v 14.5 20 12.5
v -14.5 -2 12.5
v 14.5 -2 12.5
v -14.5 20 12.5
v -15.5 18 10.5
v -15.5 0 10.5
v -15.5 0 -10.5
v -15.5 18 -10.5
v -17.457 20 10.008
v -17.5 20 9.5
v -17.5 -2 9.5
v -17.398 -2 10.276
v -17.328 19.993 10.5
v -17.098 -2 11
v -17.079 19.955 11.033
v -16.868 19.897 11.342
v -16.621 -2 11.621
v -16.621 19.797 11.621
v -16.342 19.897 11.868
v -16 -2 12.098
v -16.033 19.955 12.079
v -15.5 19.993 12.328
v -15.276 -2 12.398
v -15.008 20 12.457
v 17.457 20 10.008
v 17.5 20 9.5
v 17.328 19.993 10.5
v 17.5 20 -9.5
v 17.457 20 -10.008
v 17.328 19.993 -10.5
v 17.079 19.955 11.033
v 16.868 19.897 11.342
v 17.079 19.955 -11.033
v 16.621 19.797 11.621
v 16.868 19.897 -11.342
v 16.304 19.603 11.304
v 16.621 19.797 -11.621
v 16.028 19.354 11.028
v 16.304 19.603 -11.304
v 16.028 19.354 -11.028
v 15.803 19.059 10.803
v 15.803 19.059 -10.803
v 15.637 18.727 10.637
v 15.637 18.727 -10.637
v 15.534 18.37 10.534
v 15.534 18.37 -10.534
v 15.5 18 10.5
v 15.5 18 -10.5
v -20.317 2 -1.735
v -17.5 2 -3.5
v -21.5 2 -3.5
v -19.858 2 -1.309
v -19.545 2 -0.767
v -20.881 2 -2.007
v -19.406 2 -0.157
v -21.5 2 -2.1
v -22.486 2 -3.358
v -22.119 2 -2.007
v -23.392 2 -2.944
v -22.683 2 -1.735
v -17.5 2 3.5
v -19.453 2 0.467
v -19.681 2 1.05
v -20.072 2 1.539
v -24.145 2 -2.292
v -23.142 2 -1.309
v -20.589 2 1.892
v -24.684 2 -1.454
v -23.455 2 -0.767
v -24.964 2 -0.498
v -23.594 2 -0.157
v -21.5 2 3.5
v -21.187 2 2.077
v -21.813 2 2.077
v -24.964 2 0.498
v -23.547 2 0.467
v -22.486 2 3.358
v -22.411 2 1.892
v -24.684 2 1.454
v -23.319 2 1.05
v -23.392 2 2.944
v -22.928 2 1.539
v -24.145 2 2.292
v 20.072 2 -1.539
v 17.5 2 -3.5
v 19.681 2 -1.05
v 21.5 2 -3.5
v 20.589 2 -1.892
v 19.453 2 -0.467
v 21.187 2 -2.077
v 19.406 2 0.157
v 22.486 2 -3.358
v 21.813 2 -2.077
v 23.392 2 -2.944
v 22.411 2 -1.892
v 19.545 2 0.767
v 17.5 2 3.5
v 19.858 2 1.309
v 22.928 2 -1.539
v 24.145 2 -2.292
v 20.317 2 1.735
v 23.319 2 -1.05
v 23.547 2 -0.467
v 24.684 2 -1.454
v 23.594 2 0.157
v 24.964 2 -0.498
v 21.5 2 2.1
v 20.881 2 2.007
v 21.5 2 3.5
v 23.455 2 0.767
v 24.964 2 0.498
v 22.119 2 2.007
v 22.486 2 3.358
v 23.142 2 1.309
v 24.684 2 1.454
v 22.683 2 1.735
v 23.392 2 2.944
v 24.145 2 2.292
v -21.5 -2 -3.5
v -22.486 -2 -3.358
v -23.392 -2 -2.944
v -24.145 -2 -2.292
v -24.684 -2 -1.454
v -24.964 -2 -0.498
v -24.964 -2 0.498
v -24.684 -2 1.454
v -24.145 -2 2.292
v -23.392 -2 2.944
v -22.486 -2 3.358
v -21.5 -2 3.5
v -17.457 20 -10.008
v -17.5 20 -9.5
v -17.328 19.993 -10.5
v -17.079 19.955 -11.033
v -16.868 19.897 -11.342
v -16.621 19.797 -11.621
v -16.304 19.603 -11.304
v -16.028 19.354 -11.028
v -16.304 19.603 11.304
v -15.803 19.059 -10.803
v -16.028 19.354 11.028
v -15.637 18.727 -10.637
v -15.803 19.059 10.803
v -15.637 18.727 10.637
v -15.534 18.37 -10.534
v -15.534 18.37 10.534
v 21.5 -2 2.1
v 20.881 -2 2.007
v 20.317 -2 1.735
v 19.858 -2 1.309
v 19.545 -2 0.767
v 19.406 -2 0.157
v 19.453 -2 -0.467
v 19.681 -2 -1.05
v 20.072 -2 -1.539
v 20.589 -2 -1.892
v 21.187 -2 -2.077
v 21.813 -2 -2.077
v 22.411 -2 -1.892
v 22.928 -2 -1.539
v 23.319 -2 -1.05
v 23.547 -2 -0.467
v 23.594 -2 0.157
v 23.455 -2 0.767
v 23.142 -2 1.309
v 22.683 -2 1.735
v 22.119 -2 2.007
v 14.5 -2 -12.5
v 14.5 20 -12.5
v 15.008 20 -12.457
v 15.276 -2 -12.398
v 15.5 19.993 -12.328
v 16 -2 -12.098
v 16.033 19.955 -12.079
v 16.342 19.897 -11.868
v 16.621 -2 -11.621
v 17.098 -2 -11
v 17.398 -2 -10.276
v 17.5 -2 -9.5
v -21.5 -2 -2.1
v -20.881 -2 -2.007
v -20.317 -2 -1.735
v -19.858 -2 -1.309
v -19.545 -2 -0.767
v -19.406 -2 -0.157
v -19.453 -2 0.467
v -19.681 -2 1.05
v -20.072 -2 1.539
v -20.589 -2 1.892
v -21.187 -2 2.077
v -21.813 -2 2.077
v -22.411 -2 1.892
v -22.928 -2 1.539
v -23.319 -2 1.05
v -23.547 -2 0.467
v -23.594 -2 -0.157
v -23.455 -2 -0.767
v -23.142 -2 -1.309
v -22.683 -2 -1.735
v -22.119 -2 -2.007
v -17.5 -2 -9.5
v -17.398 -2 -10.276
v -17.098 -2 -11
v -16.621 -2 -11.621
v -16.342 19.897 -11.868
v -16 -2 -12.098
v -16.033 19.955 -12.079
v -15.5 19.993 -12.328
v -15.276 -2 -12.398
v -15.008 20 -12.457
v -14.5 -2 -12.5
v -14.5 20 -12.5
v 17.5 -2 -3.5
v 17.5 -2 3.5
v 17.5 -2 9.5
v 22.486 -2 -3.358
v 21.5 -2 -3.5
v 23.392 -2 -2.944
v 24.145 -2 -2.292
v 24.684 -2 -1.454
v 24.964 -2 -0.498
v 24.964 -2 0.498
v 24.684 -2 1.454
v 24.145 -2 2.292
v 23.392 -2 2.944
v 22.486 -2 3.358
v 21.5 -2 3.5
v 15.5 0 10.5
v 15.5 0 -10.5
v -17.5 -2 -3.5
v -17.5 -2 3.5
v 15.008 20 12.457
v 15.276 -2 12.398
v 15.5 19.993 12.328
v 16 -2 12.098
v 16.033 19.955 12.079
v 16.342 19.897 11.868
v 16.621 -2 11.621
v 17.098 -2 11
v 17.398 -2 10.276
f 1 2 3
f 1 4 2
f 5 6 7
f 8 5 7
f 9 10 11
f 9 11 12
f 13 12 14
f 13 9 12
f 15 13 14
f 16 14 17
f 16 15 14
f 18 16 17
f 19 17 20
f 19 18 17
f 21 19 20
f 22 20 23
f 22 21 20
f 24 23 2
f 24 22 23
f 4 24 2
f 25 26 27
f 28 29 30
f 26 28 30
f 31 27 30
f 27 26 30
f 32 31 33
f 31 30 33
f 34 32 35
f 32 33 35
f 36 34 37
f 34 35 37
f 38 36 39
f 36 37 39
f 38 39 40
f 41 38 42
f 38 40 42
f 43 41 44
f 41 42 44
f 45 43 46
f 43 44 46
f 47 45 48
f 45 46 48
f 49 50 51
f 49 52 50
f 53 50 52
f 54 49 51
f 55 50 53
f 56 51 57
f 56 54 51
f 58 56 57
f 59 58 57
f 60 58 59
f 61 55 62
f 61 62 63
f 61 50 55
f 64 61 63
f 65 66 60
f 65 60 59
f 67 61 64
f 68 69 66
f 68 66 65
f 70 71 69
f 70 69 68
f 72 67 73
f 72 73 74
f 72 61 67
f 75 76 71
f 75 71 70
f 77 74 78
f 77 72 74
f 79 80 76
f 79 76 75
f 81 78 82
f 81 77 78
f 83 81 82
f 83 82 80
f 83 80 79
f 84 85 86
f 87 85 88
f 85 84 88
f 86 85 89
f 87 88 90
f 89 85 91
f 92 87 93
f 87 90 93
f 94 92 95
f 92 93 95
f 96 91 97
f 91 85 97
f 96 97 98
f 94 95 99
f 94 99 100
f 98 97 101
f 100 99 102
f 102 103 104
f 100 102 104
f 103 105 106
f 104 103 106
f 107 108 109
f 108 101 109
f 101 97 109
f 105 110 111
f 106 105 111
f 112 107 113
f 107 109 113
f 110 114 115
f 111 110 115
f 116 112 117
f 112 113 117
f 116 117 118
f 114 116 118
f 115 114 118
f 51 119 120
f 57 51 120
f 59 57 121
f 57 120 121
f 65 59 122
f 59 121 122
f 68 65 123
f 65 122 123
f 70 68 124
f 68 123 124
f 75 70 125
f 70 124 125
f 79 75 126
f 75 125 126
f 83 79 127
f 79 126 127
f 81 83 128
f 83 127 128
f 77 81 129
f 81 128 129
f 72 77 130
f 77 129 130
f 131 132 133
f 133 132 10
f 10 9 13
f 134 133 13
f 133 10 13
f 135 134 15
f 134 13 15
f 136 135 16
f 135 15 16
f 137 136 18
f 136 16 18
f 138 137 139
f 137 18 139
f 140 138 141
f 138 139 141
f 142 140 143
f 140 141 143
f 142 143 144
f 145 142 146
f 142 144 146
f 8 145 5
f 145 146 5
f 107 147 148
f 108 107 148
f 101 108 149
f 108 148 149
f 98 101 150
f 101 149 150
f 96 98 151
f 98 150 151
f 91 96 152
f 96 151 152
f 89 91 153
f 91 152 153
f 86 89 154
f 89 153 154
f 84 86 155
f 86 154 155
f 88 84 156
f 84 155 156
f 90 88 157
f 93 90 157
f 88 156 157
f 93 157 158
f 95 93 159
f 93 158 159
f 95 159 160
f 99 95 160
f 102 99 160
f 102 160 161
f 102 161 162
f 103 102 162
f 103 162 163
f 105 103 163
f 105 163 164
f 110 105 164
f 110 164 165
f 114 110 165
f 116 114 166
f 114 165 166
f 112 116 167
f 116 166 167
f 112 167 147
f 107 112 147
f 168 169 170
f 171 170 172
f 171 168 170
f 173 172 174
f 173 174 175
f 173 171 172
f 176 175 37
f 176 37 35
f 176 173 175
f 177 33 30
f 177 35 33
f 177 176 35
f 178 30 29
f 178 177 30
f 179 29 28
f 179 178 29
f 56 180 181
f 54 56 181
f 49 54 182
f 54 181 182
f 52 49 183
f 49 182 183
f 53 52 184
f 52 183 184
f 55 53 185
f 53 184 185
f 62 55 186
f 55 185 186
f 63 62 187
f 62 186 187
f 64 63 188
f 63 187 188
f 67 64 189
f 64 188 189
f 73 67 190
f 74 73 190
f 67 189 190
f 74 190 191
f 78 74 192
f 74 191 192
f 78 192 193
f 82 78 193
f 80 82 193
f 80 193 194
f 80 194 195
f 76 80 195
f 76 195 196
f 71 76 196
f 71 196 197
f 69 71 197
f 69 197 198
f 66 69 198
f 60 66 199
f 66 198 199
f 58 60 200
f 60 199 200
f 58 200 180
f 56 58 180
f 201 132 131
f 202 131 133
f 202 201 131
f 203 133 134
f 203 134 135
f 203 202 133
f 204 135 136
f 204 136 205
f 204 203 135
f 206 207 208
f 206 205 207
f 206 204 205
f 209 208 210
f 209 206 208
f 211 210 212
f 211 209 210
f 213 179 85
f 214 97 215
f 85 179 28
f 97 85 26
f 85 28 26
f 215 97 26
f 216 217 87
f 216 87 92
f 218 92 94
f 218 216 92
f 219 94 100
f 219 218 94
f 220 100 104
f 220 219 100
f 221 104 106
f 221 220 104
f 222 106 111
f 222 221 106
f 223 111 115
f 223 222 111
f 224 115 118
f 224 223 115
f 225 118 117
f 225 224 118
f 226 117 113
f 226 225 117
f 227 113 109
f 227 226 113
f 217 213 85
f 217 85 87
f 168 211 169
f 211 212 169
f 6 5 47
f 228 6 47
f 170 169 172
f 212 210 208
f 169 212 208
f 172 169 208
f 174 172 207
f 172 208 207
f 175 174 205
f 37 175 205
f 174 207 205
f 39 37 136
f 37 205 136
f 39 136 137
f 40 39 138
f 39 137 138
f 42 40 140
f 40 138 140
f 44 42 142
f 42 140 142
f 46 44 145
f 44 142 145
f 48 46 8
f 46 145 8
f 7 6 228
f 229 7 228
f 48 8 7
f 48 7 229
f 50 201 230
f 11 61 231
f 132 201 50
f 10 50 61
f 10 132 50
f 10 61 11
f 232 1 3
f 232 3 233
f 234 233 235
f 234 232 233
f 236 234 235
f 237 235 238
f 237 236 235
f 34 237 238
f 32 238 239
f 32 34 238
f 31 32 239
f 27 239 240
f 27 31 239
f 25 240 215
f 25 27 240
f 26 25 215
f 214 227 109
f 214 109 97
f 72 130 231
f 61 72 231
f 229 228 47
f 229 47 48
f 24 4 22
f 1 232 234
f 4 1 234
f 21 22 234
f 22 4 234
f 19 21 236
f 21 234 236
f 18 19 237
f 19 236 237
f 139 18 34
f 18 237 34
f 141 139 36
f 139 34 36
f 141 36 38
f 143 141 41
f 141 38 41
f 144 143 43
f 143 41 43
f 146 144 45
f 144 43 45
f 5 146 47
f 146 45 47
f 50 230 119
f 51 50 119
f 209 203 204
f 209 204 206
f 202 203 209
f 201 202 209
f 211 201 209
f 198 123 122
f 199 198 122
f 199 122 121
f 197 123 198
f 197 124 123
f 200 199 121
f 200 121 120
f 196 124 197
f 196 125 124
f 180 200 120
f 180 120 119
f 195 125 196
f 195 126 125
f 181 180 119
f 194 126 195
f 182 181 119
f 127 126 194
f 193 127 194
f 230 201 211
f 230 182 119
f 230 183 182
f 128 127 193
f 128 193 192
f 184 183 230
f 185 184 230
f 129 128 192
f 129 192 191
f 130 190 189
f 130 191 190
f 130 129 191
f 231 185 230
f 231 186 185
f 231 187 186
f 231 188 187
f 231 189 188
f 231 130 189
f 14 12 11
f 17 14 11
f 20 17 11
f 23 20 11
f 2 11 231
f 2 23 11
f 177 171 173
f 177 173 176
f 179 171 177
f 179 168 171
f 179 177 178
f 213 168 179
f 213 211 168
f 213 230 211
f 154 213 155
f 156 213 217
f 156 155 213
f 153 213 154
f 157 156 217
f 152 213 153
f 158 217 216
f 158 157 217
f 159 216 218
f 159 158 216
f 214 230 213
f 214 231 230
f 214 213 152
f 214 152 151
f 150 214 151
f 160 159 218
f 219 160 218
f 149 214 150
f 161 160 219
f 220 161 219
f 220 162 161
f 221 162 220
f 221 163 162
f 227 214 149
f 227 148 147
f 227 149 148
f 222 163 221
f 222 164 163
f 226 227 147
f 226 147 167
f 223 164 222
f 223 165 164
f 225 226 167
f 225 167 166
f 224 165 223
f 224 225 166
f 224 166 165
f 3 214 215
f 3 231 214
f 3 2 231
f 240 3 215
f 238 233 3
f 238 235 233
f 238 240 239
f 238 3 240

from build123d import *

# Parameters (mm, degrees)
SKETCH2_W           = 35
SKETCH2_H           = 25
SKETCH2_W_2         = 31
SKETCH2_H_2         = 21
BOSS_EXTRUDE1_DEPTH = 20
SKETCH3_W           = 35
SKETCH3_H           = 25
BOSS_EXTRUDE2_DEPTH = 2
SKETCH4_R           = 2.1
BOSS_EXTRUDE3_DEPTH = 4
FILLET1_R           = 3
FILLET2_R           = 2


with BuildPart() as part:
    # Sketch2 → Boss-Extrude1 (new body)
    with BuildSketch(Plane(origin=(0, 0, 0), x_dir=(1, 0, 0), z_dir=(0, 1, 0))):
        Rectangle(SKETCH2_W, SKETCH2_H)
        Rectangle(SKETCH2_W_2, SKETCH2_H_2, mode=Mode.SUBTRACT)
    extrude(amount=BOSS_EXTRUDE1_DEPTH)

    # Sketch3 → Boss-Extrude2 (add)
    with BuildSketch(Plane.XZ):
        Rectangle(SKETCH3_W, SKETCH3_H)
    extrude(amount=BOSS_EXTRUDE2_DEPTH)

    # Sketch4 → Boss-Extrude3 (add)
    # profile 1 of 2: a face of its own
    with BuildSketch(Plane.XZ.offset(2)):
        with BuildLine():
            Line((-21.5, 3.5), (-17.5, 3.5))
            Line((-17.5, 3.5), (-17.5, -3.5))
            Line((-17.5, -3.5), (-21.5, -3.5))
            ThreePointArc((-21.5, -3.5), (-25, 0), (-21.5, 3.5))
        make_face()
        with Locations(Location((-21.5, 0, 0), (0, 0, 270))):
            Circle(SKETCH4_R, mode=Mode.SUBTRACT)
    # profile 2 of 2: a face of its own
    with BuildSketch(Plane.XZ.offset(2)):
        with BuildLine():
            Line((17.5, 3.5), (17.5, -3.5))
            Line((17.5, -3.5), (21.5, -3.5))
            ThreePointArc((21.5, -3.5), (25, 0), (21.5, 3.5))
            Line((21.5, 3.5), (17.5, 3.5))
        make_face()
        with Locations(Location((21.5, 0, 0), (0, 0, 90))):
            Circle(SKETCH4_R, mode=Mode.SUBTRACT)
    extrude(amount=-BOSS_EXTRUDE3_DEPTH)

    # Fillet1
    fillet1_edges = [part.edges().sort_by_distance(p)[0] for p in [
        (17.5, 9, 12.5),
        (-17.5, 9, 12.5),
        (-17.5, 9, -12.5),
        (17.5, 9, -12.5),
    ]]
    fillet(fillet1_edges, radius=FILLET1_R)

    # Fillet2
    # the kernel refuses this fillet: 2 mm, written as the material it takes off along each edge
    with BuildSketch(Plane(origin=(15.5, 20, -10.5), x_dir=(1, 0, 0), z_dir=(0, 0, 1)), Plane(origin=(-15.5, 20, 10.5), x_dir=(-1, 0, 0), z_dir=(0, 0, -1))) as fillet2_piece_1:
        with BuildLine():
            CenterArc((FILLET2_R, -FILLET2_R), FILLET2_R, 90, 90)
            Line((0, -FILLET2_R), (-FILLET2_R * 0.02, -FILLET2_R))
            Line((-FILLET2_R * 0.02, -FILLET2_R), (-FILLET2_R * 0.02, FILLET2_R * 0.02))
            Line((-FILLET2_R * 0.02, FILLET2_R * 0.02), (FILLET2_R, FILLET2_R * 0.02))
            Line((FILLET2_R, FILLET2_R * 0.02), (FILLET2_R, 0))
        make_face()
    extrude(amount=21, mode=Mode.SUBTRACT)
    with BuildSketch(Plane(origin=(-15.5, 20, -10.5), x_dir=(0, 0, -1), z_dir=(1, 0, 0)), Plane(origin=(15.5, 20, 10.5), x_dir=(0, 0, 1), z_dir=(-1, 0, 0))) as fillet2_piece_2:
        with BuildLine():
            CenterArc((FILLET2_R, -FILLET2_R), FILLET2_R, 90, 90)
            Line((0, -FILLET2_R), (-FILLET2_R * 0.02, -FILLET2_R))
            Line((-FILLET2_R * 0.02, -FILLET2_R), (-FILLET2_R * 0.02, FILLET2_R * 0.02))
            Line((-FILLET2_R * 0.02, FILLET2_R * 0.02), (FILLET2_R, FILLET2_R * 0.02))
            Line((FILLET2_R, FILLET2_R * 0.02), (FILLET2_R, 0))
        make_face()
    extrude(amount=31, mode=Mode.SUBTRACT)
    with BuildSketch(Plane(origin=(15.5, 20, -15.5), x_dir=(1, 0, 0), z_dir=(0, 0, 1))) as fillet2_piece_3a_section:
        with BuildLine():
            CenterArc((FILLET2_R, -FILLET2_R), FILLET2_R, 90, 90)
            Line((0, -FILLET2_R), (-FILLET2_R * 0.02, -FILLET2_R))
            Line((-FILLET2_R * 0.02, -FILLET2_R), (-FILLET2_R * 0.02, FILLET2_R * 0.02))
            Line((-FILLET2_R * 0.02, FILLET2_R * 0.02), (FILLET2_R, FILLET2_R * 0.02))
            Line((FILLET2_R, FILLET2_R * 0.02), (FILLET2_R, 0))
        make_face()
    fillet2_piece_3a = extrude(amount=26, mode=Mode.PRIVATE)
    fillet2_piece_3a = split(fillet2_piece_3a, bisect_by=Plane(origin=(15.952790229, 19.547209771, -10.5), z_dir=(0, 0, -1)), keep=Keep.TOP, mode=Mode.PRIVATE)
    with BuildSketch(Plane(origin=(-15.5, 20, -10.5), x_dir=(0, 0, -1), z_dir=(1, 0, 0))) as fillet2_piece_3b_section:
        with BuildLine():
            CenterArc((FILLET2_R, -FILLET2_R), FILLET2_R, 90, 90)
            Line((0, -FILLET2_R), (-FILLET2_R * 0.02, -FILLET2_R))
            Line((-FILLET2_R * 0.02, -FILLET2_R), (-FILLET2_R * 0.02, FILLET2_R * 0.02))
            Line((-FILLET2_R * 0.02, FILLET2_R * 0.02), (FILLET2_R, FILLET2_R * 0.02))
            Line((FILLET2_R, FILLET2_R * 0.02), (FILLET2_R, 0))
        make_face()
    fillet2_piece_3b = extrude(amount=36, mode=Mode.PRIVATE)
    fillet2_piece_3b = split(fillet2_piece_3b, bisect_by=Plane(origin=(15.5, 19.547209771, -10.952790229), z_dir=(1, 0, 0)), keep=Keep.TOP, mode=Mode.PRIVATE)
    fillet2_piece_3 = fillet2_piece_3a & fillet2_piece_3b
    add(fillet2_piece_3, mode=Mode.SUBTRACT)
    with BuildSketch(Plane(origin=(20.5, 20, 10.5), x_dir=(0, 0, 1), z_dir=(-1, 0, 0))) as fillet2_piece_4a_section:
        with BuildLine():
            CenterArc((FILLET2_R, -FILLET2_R), FILLET2_R, 90, 90)
            Line((0, -FILLET2_R), (-FILLET2_R * 0.02, -FILLET2_R))
            Line((-FILLET2_R * 0.02, -FILLET2_R), (-FILLET2_R * 0.02, FILLET2_R * 0.02))
            Line((-FILLET2_R * 0.02, FILLET2_R * 0.02), (FILLET2_R, FILLET2_R * 0.02))
            Line((FILLET2_R, FILLET2_R * 0.02), (FILLET2_R, 0))
        make_face()
    fillet2_piece_4a = extrude(amount=36, mode=Mode.PRIVATE)
    fillet2_piece_4a = split(fillet2_piece_4a, bisect_by=Plane(origin=(15.5, 19.547209771, 10.952790229), z_dir=(1, 0, 0)), keep=Keep.TOP, mode=Mode.PRIVATE)
    with BuildSketch(Plane(origin=(15.5, 20, -10.5), x_dir=(1, 0, 0), z_dir=(0, 0, 1))) as fillet2_piece_4b_section:
        with BuildLine():
            CenterArc((FILLET2_R, -FILLET2_R), FILLET2_R, 90, 90)
            Line((0, -FILLET2_R), (-FILLET2_R * 0.02, -FILLET2_R))
            Line((-FILLET2_R * 0.02, -FILLET2_R), (-FILLET2_R * 0.02, FILLET2_R * 0.02))
            Line((-FILLET2_R * 0.02, FILLET2_R * 0.02), (FILLET2_R, FILLET2_R * 0.02))
            Line((FILLET2_R, FILLET2_R * 0.02), (FILLET2_R, 0))
        make_face()
    fillet2_piece_4b = extrude(amount=26, mode=Mode.PRIVATE)
    fillet2_piece_4b = split(fillet2_piece_4b, bisect_by=Plane(origin=(15.952790229, 19.547209771, 10.5), z_dir=(0, 0, 1)), keep=Keep.TOP, mode=Mode.PRIVATE)
    fillet2_piece_4 = fillet2_piece_4a & fillet2_piece_4b
    add(fillet2_piece_4, mode=Mode.SUBTRACT)
    with BuildSketch(Plane(origin=(-15.5, 20, 10.5), x_dir=(-1, 0, 0), z_dir=(0, 0, -1))) as fillet2_piece_5a_section:
        with BuildLine():
            CenterArc((FILLET2_R, -FILLET2_R), FILLET2_R, 90, 90)
            Line((0, -FILLET2_R), (-FILLET2_R * 0.02, -FILLET2_R))
            Line((-FILLET2_R * 0.02, -FILLET2_R), (-FILLET2_R * 0.02, FILLET2_R * 0.02))
            Line((-FILLET2_R * 0.02, FILLET2_R * 0.02), (FILLET2_R, FILLET2_R * 0.02))
            Line((FILLET2_R, FILLET2_R * 0.02), (FILLET2_R, 0))
        make_face()
    fillet2_piece_5a = extrude(amount=26, mode=Mode.PRIVATE)
    fillet2_piece_5a = split(fillet2_piece_5a, bisect_by=Plane(origin=(-15.952790229, 19.547209771, -10.5), z_dir=(0, 0, -1)), keep=Keep.TOP, mode=Mode.PRIVATE)
    with BuildSketch(Plane(origin=(-20.5, 20, -10.5), x_dir=(0, 0, -1), z_dir=(1, 0, 0))) as fillet2_piece_5b_section:
        with BuildLine():
            CenterArc((FILLET2_R, -FILLET2_R), FILLET2_R, 90, 90)
            Line((0, -FILLET2_R), (-FILLET2_R * 0.02, -FILLET2_R))
            Line((-FILLET2_R * 0.02, -FILLET2_R), (-FILLET2_R * 0.02, FILLET2_R * 0.02))
            Line((-FILLET2_R * 0.02, FILLET2_R * 0.02), (FILLET2_R, FILLET2_R * 0.02))
            Line((FILLET2_R, FILLET2_R * 0.02), (FILLET2_R, 0))
        make_face()
    fillet2_piece_5b = extrude(amount=36, mode=Mode.PRIVATE)
    fillet2_piece_5b = split(fillet2_piece_5b, bisect_by=Plane(origin=(-15.5, 19.547209771, -10.952790229), z_dir=(-1, 0, 0)), keep=Keep.TOP, mode=Mode.PRIVATE)
    fillet2_piece_5 = fillet2_piece_5a & fillet2_piece_5b
    add(fillet2_piece_5, mode=Mode.SUBTRACT)
    with BuildSketch(Plane(origin=(-15.5, 20, 15.5), x_dir=(-1, 0, 0), z_dir=(0, 0, -1))) as fillet2_piece_6a_section:
        with BuildLine():
            CenterArc((FILLET2_R, -FILLET2_R), FILLET2_R, 90, 90)
            Line((0, -FILLET2_R), (-FILLET2_R * 0.02, -FILLET2_R))
            Line((-FILLET2_R * 0.02, -FILLET2_R), (-FILLET2_R * 0.02, FILLET2_R * 0.02))
            Line((-FILLET2_R * 0.02, FILLET2_R * 0.02), (FILLET2_R, FILLET2_R * 0.02))
            Line((FILLET2_R, FILLET2_R * 0.02), (FILLET2_R, 0))
        make_face()
    fillet2_piece_6a = extrude(amount=26, mode=Mode.PRIVATE)
    fillet2_piece_6a = split(fillet2_piece_6a, bisect_by=Plane(origin=(-15.952790229, 19.547209771, 10.5), z_dir=(0, 0, 1)), keep=Keep.TOP, mode=Mode.PRIVATE)
    with BuildSketch(Plane(origin=(15.5, 20, 10.5), x_dir=(0, 0, 1), z_dir=(-1, 0, 0))) as fillet2_piece_6b_section:
        with BuildLine():
            CenterArc((FILLET2_R, -FILLET2_R), FILLET2_R, 90, 90)
            Line((0, -FILLET2_R), (-FILLET2_R * 0.02, -FILLET2_R))
            Line((-FILLET2_R * 0.02, -FILLET2_R), (-FILLET2_R * 0.02, FILLET2_R * 0.02))
            Line((-FILLET2_R * 0.02, FILLET2_R * 0.02), (FILLET2_R, FILLET2_R * 0.02))
            Line((FILLET2_R, FILLET2_R * 0.02), (FILLET2_R, 0))
        make_face()
    fillet2_piece_6b = extrude(amount=36, mode=Mode.PRIVATE)
    fillet2_piece_6b = split(fillet2_piece_6b, bisect_by=Plane(origin=(-15.5, 19.547209771, 10.952790229), z_dir=(-1, 0, 0)), keep=Keep.TOP, mode=Mode.PRIVATE)
    fillet2_piece_6 = fillet2_piece_6a & fillet2_piece_6b
    add(fillet2_piece_6, mode=Mode.SUBTRACT)


solid = part.part
